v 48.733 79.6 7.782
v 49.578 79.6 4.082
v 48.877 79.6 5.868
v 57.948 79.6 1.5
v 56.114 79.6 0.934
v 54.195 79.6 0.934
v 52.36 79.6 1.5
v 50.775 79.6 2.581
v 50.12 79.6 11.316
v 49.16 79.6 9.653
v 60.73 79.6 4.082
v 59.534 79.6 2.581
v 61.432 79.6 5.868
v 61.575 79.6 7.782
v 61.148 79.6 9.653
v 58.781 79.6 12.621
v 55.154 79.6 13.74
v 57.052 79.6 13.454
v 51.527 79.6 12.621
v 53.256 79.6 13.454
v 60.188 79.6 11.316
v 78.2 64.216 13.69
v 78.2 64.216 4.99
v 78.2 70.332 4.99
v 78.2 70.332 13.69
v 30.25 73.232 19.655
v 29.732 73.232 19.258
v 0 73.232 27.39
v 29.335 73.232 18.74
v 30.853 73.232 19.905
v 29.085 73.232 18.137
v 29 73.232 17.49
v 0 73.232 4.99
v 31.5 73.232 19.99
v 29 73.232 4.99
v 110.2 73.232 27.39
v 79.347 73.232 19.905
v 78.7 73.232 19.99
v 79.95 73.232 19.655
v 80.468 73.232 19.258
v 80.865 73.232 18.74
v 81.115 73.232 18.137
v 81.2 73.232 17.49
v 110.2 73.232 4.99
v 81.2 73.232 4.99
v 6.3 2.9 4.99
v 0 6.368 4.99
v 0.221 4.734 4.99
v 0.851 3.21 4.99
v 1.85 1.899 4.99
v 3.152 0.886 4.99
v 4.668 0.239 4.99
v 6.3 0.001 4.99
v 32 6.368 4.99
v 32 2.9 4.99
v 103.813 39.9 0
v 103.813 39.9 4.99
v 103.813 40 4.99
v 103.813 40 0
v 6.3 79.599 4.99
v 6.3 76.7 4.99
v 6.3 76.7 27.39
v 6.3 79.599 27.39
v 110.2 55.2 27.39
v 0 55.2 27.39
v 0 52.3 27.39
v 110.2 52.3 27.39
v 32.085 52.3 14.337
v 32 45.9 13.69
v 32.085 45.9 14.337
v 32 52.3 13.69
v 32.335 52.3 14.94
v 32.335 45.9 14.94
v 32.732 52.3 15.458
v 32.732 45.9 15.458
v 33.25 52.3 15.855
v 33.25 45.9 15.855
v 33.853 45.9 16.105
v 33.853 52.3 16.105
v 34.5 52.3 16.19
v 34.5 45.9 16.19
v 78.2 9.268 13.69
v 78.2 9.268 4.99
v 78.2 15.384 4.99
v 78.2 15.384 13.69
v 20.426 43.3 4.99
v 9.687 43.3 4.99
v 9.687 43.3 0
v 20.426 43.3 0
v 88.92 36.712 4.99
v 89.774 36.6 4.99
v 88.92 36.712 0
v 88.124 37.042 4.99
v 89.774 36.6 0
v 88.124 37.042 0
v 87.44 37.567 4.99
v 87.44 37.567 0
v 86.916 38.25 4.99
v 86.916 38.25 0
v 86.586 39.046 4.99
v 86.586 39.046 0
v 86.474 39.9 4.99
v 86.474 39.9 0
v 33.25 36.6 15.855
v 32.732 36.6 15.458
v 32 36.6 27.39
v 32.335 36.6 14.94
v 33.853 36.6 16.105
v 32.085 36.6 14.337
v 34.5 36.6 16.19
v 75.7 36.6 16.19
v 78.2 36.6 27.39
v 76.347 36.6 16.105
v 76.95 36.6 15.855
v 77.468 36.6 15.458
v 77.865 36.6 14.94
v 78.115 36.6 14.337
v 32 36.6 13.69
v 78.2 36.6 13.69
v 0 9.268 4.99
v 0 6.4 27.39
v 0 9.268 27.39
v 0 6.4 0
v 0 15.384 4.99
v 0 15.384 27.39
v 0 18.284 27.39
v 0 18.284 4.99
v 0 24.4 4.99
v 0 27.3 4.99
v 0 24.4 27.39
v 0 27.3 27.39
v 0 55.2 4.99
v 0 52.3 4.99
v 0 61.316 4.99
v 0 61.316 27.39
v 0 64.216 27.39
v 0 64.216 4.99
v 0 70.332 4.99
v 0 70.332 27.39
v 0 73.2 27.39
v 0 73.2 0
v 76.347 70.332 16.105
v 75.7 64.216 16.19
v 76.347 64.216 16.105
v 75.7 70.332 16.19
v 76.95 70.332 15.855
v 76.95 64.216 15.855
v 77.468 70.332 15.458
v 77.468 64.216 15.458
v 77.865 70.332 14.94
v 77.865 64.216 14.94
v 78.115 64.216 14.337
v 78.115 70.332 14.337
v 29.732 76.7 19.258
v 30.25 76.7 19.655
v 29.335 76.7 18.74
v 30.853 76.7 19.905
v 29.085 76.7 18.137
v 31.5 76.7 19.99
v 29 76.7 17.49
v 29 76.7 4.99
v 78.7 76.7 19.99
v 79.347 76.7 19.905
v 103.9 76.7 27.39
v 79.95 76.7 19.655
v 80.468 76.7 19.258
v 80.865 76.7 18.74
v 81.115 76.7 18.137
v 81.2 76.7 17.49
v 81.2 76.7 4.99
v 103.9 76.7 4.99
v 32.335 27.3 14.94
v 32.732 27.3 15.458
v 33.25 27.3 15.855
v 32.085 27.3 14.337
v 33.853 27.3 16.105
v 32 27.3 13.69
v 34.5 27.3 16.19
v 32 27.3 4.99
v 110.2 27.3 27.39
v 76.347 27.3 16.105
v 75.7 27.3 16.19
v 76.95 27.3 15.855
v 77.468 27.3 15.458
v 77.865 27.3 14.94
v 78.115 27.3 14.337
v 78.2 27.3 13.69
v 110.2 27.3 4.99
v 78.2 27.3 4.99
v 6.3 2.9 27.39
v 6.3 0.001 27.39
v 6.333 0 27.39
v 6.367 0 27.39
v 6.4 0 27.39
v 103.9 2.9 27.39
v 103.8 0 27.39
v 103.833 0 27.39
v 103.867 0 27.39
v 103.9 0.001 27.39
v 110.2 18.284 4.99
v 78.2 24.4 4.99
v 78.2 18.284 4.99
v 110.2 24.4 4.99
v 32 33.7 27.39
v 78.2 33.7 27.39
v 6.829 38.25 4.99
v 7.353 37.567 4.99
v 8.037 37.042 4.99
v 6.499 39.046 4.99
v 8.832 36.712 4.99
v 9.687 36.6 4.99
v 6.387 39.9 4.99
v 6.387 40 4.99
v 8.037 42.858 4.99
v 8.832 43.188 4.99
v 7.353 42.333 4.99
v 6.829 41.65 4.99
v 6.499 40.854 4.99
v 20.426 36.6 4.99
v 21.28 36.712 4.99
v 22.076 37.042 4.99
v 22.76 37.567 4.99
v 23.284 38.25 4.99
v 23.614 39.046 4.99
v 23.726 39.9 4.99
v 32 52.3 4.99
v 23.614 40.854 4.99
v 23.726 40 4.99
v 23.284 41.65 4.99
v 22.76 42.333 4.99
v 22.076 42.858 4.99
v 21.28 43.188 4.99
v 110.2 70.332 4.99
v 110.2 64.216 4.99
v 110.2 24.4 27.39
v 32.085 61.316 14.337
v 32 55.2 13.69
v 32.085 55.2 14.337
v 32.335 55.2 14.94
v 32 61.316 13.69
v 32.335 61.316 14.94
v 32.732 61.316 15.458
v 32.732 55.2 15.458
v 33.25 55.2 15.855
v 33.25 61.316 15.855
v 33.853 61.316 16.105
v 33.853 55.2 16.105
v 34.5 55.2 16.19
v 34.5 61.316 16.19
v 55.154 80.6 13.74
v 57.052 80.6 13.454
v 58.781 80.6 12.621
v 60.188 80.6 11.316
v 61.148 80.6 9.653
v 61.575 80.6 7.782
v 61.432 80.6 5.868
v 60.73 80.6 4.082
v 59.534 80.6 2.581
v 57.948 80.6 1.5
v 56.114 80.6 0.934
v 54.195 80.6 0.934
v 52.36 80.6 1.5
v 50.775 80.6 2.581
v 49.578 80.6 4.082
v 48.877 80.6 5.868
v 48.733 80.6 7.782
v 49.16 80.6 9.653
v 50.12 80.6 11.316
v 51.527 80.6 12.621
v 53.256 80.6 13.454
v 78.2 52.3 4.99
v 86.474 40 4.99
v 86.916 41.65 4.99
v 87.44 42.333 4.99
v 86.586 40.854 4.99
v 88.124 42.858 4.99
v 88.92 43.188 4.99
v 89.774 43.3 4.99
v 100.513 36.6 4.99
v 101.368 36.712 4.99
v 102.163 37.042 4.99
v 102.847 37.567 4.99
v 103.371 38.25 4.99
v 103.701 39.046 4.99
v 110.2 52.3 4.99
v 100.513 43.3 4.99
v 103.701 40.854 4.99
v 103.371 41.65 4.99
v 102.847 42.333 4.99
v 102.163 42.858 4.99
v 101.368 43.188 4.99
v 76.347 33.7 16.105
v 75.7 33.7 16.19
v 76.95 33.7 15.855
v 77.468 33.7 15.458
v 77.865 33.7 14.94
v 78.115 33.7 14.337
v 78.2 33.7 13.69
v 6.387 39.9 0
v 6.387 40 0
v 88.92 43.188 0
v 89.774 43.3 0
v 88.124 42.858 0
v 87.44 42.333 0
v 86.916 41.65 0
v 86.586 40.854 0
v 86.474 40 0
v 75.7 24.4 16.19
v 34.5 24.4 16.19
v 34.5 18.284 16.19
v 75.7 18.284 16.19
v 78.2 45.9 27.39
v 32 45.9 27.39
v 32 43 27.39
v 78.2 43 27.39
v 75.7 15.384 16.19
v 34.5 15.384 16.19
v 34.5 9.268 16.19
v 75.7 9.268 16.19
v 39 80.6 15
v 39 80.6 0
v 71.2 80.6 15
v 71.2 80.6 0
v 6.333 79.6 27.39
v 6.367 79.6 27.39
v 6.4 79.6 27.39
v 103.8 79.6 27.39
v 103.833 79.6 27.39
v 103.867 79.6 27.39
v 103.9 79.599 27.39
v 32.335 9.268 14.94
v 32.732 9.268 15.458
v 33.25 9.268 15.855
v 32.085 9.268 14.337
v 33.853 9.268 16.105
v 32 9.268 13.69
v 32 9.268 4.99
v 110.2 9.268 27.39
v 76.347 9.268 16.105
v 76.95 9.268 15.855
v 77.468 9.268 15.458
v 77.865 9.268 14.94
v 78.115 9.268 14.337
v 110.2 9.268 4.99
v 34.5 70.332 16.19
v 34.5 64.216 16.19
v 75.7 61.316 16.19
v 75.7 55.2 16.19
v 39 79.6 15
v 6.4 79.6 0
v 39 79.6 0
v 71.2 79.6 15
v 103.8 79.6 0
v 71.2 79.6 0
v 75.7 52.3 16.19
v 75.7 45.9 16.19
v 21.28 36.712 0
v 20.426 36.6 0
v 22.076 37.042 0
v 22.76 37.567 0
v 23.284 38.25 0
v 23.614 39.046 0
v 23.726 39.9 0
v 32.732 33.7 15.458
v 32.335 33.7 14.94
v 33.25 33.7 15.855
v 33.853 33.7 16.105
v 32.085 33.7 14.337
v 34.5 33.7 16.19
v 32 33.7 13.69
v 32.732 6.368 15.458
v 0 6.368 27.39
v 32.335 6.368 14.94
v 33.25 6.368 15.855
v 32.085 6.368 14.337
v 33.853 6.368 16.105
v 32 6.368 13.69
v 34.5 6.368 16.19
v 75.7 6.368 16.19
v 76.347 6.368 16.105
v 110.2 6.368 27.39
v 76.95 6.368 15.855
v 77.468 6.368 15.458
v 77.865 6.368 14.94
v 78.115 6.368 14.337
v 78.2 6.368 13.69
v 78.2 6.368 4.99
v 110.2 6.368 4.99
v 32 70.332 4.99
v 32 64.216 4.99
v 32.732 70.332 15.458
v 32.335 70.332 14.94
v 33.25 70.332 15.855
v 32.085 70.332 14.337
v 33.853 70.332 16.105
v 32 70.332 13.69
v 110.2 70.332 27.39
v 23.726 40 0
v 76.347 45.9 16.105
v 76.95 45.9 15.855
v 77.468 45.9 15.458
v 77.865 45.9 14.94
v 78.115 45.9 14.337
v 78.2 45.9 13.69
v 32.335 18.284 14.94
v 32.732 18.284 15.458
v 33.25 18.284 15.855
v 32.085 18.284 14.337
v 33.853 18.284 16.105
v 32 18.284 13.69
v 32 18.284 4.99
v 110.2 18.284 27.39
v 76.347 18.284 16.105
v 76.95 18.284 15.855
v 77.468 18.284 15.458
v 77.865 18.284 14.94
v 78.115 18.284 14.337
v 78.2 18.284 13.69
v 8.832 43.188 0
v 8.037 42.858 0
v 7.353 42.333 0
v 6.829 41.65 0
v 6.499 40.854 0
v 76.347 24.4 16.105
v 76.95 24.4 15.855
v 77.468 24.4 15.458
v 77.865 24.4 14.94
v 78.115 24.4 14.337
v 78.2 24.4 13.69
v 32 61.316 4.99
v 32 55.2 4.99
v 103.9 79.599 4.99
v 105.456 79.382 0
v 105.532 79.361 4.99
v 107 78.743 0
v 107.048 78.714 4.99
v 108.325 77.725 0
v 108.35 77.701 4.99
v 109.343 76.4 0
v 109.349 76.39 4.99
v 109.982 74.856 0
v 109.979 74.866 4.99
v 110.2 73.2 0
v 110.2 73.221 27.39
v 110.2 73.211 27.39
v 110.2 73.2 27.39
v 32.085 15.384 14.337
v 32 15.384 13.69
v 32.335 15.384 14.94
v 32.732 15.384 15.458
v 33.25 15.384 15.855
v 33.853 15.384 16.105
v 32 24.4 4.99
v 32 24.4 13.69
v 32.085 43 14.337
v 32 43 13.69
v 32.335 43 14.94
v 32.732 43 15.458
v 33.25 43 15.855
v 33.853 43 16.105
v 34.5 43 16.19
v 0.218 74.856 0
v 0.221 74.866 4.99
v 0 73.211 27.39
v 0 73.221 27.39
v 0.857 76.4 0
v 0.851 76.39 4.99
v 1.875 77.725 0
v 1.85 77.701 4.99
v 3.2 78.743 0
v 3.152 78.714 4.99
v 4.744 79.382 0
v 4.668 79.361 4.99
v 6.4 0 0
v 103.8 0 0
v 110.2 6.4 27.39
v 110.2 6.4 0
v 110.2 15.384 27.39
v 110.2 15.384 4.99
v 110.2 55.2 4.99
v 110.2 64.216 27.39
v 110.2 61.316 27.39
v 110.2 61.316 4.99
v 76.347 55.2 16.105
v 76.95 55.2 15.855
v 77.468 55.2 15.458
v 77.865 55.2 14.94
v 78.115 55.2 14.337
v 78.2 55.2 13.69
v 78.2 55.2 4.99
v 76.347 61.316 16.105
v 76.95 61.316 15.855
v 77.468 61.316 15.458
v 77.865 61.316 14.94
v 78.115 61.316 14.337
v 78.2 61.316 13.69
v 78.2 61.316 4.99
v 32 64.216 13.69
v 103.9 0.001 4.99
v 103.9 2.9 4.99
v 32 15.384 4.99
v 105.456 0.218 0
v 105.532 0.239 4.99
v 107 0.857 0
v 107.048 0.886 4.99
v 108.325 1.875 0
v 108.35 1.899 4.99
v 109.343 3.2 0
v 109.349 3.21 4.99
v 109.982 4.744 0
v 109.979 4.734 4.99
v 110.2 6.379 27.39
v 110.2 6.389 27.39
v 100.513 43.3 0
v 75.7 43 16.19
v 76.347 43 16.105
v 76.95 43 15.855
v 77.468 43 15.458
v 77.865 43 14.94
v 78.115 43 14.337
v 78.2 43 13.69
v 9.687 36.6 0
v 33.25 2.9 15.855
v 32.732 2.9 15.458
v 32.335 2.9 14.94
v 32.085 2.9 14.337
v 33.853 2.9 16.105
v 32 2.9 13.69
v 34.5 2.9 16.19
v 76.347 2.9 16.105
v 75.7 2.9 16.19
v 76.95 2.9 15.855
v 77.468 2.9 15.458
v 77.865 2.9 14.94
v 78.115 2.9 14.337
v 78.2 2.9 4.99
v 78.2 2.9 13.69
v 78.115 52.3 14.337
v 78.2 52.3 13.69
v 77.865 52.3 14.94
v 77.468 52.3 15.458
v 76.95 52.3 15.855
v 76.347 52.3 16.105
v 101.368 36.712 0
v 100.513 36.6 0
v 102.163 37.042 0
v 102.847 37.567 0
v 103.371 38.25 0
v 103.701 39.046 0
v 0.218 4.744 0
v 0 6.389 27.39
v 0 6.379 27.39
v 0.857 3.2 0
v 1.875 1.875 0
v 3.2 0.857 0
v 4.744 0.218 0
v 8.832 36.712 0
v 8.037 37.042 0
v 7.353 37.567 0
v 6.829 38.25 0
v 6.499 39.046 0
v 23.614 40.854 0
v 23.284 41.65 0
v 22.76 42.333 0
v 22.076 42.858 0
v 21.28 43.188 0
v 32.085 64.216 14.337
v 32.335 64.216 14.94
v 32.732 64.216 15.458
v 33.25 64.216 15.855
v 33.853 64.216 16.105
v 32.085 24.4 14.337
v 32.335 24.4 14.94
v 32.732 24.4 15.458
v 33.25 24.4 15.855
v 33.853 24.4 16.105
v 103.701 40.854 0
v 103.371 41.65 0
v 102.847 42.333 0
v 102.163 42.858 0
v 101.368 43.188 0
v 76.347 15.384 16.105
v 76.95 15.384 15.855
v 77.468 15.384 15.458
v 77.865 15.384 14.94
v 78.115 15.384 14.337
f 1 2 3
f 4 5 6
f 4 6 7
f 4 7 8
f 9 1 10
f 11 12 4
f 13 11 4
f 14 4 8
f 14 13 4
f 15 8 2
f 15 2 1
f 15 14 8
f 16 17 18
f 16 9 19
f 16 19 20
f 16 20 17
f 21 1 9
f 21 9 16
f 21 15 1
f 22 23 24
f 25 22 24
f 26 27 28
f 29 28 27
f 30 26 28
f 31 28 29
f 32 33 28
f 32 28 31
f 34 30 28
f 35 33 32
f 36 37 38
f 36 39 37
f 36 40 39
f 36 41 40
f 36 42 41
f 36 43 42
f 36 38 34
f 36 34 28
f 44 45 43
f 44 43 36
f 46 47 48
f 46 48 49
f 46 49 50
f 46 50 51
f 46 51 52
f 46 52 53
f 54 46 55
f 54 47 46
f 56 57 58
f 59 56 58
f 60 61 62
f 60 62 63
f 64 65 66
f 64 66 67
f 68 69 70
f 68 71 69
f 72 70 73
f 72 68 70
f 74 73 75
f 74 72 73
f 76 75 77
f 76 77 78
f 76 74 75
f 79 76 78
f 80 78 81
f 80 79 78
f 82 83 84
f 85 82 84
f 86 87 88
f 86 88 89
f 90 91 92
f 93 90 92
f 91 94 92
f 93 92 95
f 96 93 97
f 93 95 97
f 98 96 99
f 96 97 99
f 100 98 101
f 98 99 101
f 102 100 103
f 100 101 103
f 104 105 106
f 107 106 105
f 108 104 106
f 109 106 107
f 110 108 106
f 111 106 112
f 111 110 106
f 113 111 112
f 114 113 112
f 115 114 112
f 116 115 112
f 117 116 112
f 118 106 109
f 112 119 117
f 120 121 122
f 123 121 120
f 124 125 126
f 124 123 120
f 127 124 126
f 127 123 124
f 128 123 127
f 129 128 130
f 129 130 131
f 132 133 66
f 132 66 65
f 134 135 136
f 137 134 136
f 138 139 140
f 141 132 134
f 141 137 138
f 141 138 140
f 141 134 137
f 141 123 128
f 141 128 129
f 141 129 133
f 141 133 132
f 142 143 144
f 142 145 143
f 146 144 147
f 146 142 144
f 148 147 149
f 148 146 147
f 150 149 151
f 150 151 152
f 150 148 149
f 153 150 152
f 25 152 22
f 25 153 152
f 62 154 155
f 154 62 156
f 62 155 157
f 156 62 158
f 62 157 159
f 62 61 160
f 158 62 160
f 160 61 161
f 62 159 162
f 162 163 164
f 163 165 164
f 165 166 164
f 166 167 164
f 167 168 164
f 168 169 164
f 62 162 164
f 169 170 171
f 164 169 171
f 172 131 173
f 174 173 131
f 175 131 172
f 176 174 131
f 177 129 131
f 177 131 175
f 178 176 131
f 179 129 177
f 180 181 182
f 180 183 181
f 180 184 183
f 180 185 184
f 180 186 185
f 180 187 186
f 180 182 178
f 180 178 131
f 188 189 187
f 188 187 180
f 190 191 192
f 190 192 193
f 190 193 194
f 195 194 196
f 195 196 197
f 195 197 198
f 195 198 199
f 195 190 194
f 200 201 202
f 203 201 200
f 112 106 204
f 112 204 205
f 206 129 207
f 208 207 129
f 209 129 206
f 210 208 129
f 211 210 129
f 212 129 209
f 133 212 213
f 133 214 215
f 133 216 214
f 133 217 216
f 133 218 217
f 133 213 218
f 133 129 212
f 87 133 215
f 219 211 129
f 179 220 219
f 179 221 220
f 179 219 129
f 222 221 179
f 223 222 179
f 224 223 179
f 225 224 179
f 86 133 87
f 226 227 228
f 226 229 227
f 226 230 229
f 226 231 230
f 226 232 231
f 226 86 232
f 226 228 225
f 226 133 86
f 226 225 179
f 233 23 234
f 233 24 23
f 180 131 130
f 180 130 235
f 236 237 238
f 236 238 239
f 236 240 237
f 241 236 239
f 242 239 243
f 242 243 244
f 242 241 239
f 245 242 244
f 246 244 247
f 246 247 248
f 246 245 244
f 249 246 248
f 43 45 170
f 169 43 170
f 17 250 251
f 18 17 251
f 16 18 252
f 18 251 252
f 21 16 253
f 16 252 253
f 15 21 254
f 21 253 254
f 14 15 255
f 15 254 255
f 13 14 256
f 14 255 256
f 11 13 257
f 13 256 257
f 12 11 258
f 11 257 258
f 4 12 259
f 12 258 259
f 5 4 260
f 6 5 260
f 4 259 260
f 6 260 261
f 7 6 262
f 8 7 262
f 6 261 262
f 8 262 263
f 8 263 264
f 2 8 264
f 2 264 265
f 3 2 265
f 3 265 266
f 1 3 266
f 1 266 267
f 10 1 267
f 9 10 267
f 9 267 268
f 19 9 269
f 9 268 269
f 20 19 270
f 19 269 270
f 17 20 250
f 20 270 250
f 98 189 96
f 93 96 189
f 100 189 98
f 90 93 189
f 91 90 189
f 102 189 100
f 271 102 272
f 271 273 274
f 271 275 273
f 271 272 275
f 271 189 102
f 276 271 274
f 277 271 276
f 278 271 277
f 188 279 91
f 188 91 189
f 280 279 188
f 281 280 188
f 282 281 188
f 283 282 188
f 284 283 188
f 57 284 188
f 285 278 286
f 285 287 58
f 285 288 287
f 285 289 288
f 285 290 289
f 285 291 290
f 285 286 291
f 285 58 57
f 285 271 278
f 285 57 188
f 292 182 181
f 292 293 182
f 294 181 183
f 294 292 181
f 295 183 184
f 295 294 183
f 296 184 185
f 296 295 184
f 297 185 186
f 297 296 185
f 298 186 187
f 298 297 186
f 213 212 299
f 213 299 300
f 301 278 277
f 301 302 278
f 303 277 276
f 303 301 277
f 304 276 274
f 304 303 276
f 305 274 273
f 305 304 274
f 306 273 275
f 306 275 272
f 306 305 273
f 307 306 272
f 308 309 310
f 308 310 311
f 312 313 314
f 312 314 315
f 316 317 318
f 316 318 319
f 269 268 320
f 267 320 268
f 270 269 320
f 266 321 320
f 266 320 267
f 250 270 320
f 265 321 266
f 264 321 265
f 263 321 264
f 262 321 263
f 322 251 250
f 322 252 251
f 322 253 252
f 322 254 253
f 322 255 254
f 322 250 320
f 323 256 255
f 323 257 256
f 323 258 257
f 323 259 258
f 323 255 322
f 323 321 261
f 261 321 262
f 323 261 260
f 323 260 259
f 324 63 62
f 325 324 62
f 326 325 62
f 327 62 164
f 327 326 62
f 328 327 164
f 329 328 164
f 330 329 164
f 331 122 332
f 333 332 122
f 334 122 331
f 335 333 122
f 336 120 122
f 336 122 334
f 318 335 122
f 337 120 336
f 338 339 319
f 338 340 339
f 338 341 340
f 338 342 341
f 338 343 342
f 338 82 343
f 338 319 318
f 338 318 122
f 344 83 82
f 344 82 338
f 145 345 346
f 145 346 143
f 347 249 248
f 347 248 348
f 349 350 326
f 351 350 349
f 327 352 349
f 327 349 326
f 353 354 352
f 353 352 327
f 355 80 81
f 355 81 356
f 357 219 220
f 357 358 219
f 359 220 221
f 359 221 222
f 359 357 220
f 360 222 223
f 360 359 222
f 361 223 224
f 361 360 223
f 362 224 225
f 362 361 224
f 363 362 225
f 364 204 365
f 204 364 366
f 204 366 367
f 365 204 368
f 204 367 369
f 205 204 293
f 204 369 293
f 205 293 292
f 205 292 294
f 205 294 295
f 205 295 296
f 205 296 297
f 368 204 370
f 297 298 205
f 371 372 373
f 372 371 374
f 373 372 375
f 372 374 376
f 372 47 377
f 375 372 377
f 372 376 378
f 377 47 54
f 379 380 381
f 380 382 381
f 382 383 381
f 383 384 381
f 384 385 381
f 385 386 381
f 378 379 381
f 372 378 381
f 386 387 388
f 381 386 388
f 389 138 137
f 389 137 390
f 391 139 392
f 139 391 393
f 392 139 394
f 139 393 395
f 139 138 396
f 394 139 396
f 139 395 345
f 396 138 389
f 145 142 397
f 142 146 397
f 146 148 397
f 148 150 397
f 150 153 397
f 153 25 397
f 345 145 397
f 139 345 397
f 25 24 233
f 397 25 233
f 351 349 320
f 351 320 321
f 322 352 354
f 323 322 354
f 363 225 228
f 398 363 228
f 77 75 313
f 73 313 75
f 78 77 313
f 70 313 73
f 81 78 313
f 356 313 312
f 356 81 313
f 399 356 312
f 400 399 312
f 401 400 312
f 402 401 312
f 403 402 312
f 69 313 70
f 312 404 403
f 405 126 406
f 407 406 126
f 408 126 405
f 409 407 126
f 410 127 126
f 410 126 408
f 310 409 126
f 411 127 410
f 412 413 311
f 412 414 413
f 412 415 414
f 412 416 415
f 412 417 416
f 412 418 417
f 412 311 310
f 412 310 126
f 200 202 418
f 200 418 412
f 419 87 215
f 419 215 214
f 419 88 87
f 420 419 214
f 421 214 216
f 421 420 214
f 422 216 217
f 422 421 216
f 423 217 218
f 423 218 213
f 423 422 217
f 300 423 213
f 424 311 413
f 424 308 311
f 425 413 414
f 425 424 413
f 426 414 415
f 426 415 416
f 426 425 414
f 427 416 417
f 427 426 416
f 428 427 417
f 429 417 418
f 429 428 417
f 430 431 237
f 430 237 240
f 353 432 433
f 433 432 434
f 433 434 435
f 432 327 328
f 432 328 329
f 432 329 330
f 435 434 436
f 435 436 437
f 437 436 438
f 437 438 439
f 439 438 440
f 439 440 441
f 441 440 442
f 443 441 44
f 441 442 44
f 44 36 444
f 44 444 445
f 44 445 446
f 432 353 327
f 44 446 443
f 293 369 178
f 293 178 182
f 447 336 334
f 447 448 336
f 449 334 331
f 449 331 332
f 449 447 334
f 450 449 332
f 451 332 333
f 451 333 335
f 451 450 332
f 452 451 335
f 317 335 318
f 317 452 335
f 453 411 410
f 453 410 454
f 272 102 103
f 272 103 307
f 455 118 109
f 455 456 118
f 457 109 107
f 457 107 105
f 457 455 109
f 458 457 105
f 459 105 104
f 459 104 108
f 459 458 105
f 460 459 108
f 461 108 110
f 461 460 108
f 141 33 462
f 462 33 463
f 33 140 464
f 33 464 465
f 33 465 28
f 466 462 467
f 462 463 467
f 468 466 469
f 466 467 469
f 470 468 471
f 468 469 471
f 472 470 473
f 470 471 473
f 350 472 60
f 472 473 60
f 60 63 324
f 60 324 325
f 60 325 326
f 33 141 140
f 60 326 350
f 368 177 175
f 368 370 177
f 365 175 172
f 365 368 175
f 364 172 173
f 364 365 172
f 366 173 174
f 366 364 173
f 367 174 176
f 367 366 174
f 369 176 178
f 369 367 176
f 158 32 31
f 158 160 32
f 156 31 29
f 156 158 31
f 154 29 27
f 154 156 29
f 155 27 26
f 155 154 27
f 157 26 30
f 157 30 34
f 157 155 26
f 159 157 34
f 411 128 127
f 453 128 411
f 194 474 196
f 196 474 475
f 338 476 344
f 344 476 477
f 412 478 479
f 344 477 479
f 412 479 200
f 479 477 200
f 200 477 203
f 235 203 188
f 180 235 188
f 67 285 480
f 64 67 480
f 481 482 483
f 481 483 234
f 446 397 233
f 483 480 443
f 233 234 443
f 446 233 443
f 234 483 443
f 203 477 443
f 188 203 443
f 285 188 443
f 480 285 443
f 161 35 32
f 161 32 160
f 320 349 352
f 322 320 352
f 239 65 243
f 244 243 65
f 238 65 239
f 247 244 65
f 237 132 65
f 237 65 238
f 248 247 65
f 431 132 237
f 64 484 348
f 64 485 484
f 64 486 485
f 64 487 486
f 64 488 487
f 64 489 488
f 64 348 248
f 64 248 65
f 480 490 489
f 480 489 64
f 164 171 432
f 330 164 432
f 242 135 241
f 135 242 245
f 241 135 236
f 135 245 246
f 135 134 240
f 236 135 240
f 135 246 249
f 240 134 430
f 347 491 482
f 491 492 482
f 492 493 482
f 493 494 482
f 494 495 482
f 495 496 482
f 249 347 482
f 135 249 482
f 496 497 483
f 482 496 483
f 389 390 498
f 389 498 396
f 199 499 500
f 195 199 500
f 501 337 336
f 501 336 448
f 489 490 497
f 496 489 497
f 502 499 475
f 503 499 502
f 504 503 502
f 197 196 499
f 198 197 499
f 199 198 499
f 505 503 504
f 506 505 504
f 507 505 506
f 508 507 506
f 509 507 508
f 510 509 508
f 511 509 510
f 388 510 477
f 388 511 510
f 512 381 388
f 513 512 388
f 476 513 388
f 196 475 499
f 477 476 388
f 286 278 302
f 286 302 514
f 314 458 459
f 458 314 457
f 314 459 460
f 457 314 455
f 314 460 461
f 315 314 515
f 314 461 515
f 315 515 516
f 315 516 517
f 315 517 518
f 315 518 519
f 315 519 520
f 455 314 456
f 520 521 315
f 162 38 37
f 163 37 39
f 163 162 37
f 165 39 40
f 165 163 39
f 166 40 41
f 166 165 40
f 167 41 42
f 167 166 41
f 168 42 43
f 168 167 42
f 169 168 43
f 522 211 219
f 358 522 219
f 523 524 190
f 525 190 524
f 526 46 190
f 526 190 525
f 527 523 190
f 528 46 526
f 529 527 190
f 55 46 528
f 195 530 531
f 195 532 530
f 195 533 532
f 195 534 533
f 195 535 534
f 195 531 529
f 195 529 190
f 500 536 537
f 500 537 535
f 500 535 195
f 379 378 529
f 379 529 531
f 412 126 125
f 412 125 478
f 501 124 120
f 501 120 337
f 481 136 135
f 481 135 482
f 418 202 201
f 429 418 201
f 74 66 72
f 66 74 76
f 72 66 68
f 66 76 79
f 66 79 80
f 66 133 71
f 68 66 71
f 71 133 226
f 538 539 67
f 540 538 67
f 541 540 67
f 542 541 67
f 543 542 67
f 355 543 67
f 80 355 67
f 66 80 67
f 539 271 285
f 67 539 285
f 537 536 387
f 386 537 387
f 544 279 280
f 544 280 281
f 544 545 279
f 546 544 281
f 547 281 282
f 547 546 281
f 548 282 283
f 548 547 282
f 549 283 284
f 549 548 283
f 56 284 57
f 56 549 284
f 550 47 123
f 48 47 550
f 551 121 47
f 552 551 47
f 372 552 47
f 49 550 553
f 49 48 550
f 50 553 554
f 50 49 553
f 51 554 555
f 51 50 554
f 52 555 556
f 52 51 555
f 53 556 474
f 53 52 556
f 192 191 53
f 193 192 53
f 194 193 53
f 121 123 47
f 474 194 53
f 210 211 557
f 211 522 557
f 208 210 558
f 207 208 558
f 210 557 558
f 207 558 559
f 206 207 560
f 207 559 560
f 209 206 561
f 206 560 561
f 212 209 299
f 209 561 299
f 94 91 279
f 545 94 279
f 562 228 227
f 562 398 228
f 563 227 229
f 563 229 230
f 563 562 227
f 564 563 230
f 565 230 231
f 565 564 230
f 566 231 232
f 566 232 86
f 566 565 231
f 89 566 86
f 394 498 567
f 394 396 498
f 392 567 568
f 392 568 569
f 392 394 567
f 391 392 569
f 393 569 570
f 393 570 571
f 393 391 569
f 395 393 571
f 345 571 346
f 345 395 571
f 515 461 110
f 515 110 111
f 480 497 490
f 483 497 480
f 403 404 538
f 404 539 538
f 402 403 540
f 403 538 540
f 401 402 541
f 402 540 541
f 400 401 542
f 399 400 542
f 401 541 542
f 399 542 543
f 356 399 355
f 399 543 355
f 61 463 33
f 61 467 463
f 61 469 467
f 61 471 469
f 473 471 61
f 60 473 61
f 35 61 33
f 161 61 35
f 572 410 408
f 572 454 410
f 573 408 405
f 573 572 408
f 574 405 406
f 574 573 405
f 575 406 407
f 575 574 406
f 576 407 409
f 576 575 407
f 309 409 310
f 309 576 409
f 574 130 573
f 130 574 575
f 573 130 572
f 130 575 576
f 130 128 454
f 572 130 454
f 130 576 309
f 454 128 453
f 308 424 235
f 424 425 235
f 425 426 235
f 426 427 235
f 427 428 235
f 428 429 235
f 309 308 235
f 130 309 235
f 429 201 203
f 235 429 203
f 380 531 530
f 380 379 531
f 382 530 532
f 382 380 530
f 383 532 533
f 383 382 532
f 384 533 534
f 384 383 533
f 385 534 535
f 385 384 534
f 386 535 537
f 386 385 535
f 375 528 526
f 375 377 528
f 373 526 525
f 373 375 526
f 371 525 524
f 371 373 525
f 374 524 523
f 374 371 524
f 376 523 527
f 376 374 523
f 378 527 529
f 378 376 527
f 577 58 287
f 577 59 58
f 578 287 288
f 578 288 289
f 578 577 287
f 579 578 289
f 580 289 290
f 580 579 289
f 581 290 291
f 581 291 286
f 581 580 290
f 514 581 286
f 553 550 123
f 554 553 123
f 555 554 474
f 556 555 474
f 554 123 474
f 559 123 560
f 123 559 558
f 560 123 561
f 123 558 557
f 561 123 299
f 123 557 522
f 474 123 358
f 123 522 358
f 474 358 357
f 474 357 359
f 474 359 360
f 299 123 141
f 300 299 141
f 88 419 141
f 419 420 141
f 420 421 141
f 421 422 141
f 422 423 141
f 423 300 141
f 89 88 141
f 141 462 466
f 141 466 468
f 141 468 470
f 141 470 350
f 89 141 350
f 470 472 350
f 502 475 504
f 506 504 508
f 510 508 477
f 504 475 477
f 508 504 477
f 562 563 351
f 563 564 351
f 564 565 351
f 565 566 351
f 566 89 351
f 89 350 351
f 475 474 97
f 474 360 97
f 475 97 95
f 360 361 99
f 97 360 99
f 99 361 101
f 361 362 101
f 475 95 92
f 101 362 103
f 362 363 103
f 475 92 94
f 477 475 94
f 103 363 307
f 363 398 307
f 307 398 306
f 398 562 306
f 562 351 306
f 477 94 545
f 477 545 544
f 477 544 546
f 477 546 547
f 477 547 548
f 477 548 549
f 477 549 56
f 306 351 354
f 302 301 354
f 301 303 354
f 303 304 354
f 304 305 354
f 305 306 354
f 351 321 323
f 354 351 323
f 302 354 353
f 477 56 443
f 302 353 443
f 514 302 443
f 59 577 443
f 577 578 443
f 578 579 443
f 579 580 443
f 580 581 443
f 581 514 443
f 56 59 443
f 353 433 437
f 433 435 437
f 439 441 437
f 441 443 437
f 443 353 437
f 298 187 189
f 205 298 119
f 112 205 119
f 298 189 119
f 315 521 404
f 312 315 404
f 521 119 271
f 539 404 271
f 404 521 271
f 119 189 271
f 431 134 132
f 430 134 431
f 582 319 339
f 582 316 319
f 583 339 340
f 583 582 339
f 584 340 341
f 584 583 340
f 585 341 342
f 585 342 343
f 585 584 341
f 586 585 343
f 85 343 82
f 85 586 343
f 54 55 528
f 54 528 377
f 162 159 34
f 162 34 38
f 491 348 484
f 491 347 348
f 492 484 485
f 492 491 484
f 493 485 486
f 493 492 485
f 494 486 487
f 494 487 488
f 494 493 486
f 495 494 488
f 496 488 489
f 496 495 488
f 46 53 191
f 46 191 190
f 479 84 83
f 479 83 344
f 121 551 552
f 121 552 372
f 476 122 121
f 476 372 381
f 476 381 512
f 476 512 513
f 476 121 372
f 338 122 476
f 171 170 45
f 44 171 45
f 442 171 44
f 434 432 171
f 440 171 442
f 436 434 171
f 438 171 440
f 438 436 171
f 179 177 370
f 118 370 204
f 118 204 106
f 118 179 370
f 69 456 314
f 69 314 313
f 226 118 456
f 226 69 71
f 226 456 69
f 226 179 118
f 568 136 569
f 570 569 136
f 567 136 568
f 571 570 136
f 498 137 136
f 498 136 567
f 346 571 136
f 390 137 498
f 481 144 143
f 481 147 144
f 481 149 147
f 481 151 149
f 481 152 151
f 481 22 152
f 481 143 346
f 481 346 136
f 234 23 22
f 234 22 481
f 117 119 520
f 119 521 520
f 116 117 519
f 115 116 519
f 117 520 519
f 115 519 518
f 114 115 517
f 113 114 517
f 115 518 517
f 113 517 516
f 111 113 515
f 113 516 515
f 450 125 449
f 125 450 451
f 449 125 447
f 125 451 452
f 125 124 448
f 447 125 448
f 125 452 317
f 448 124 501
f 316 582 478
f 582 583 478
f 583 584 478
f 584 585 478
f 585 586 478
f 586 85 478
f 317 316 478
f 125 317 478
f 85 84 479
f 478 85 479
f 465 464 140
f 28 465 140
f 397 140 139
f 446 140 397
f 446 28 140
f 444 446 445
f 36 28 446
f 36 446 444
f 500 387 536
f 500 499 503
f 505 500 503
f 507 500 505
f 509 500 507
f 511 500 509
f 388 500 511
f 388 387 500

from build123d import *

# Parameters (mm, degrees)
SKETCH_1_W          = 110.2
SKETCH_1_H          = 79.6
EXTRUDE_1_DEPTH     = 4.99
SKETCH_2_W          = 52.2
SKETCH_2_H          = 6.4
EXTRUDE_2_DEPTH     = 15
SKETCH_3_W          = 46.2
SKETCH_3_H          = 73.2
EXTRUDE_3_DEPTH     = 11.2
SKETCH_4_W          = 97.6
SKETCH_4_H          = 2.9
SKETCH_4_W_2        = 46.2
SKETCH_4_W_3        = 110.2
EXTRUDE_4_DEPTH     = 22.4
SKETCH_5_W          = 17.339600334
SKETCH_5_H          = 6.7
CUT_EXTRUDE_1_DEPTH = 138.775034023
FILLET_1_R          = 3.3
FILLET_2_R          = 6.4
FILLET_3_R          = 2.5
SKETCH_6_W          = 32.2
SKETCH_6_H          = 15
EXTRUDE_5_DEPTH     = 1
SKETCH_7_R          = 6.438822501
CUT_EXTRUDE_2_DEPTH = 1


with BuildPart() as part:
    # ｽｹｯﾁ1 → ﾎﾞｽ - 押し出し1 (new body)
    with BuildSketch(Plane.XY):
        with Locations((55.1, 39.8)):
            Rectangle(SKETCH_1_W, SKETCH_1_H)
    extrude(amount=EXTRUDE_1_DEPTH)

    # ｽｹｯﾁ2 → ﾎﾞｽ - 押し出し2 (add)
    with BuildSketch(Plane.XY.offset(4.99)):
        with Locations((55.1, 76.4)):
            Rectangle(SKETCH_2_W, SKETCH_2_H)
    extrude(amount=EXTRUDE_2_DEPTH)

    # ｽｹｯﾁ3 → ﾎﾞｽ - 押し出し3 (add)
    with BuildSketch(Plane.XY.offset(4.99)):
        with Locations((55.1, 36.6)):
            Rectangle(SKETCH_3_W, SKETCH_3_H)
    extrude(amount=EXTRUDE_3_DEPTH)

    # ｽｹｯﾁ4 → ﾎﾞｽ - 押し出し4 (add)
    with BuildSketch(Plane.XY.offset(4.99)):
        with Locations((55.1, 78.15)):
            Rectangle(SKETCH_4_W, SKETCH_4_H)
        with Locations((55.1, 1.45)):
            Rectangle(SKETCH_4_W, SKETCH_4_H)
        with Locations((55.1, 44.45)):
            Rectangle(SKETCH_4_W_2, SKETCH_4_H)
        with Locations((55.1, 35.15)):
            Rectangle(SKETCH_4_W_2, SKETCH_4_H)
        with Locations((55.1, 53.75)):
            Rectangle(SKETCH_4_W_3, SKETCH_4_H)
        with Locations((55.1, 25.85)):
            Rectangle(SKETCH_4_W_3, SKETCH_4_H)
        with Locations((55.1, 71.781871857)):
            Rectangle(SKETCH_4_W_3, SKETCH_4_H)
        with Locations((55.1, 7.818128143)):
            Rectangle(SKETCH_4_W_3, SKETCH_4_H)
        with Locations((55.1, 16.834064072)):
            Rectangle(SKETCH_4_W_3, SKETCH_4_H)
        with Locations((55.1, 62.765935928)):
            Rectangle(SKETCH_4_W_3, SKETCH_4_H)
    extrude(amount=EXTRUDE_4_DEPTH)

    # ｽｹｯﾁ5 → ｶｯﾄ - 押し出し1 (cut, through all)
    with BuildSketch(Plane.XY.offset(4.99)):
        with Locations((15.05636048, 39.95)):
            Rectangle(SKETCH_5_W, SKETCH_5_H)
        with Locations((95.14363952, 39.95)):
            Rectangle(SKETCH_5_W, SKETCH_5_H)
    extrude(amount=-CUT_EXTRUDE_1_DEPTH, mode=Mode.SUBTRACT)

    # ﾌｨﾚｯﾄ1
    fillet_1_edges = [part.edges().sort_by_distance(p)[0] for p in [
        (6.386560313, 36.6, 2.495),
        (6.386560313, 43.3, 2.495),
        (23.726160647, 43.3, 2.495),
        (23.726160647, 36.6, 2.495),
        (86.473839353, 43.3, 2.495),
        (103.813439687, 43.3, 2.495),
        (103.813439687, 36.6, 2.495),
        (86.473839353, 36.6, 2.495),
    ]]
    fillet(fillet_1_edges, radius=FILLET_1_R)

    # ﾌｨﾚｯﾄ2
    fillet_2_edges = [part.edges().sort_by_distance(p)[0] for p in [
        (0, 0, 2.495),
        (110.2, 0, 2.495),
        (110.2, 79.6, 2.495),
        (0, 79.6, 2.495),
    ]]
    fillet(fillet_2_edges, radius=FILLET_2_R)

    # ﾌｨﾚｯﾄ3
    fillet_3_edges = [part.edges().sort_by_distance(p)[0] for p in [
        (78.2, 49.1, 16.19),
        (32, 39.8, 16.19),
        (78.2, 58.257967964, 16.19),
        (32, 49.1, 16.19),
        (78.2, 30.5, 16.19),
        (32, 21.342032036, 16.19),
        (81.2, 74.965935928, 19.99),
        (32, 67.273903893, 16.19),
        (78.2, 12.326096107, 16.19),
        (32, 4.634064072, 16.19),
        (32, 12.326096107, 16.19),
        (78.2, 21.342032036, 16.19),
        (78.2, 67.273903893, 16.19),
        (32, 58.257967964, 16.19),
        (29, 74.965935928, 19.99),
        (78.2, 4.634064072, 16.19),
        (32, 30.5, 16.19),
        (78.2, 39.8, 16.19),
    ]]
    fillet(fillet_3_edges, radius=FILLET_3_R)

    # ｽｹｯﾁ6 → ﾎﾞｽ - 押し出し5 (add)
    with BuildSketch(Plane(origin=(0, 79.6, 0), x_dir=(1, 0, 0), z_dir=(0, 1, 0))):
        with Locations((55.1, -7.5)):
            Rectangle(SKETCH_6_W, SKETCH_6_H)
    extrude(amount=EXTRUDE_5_DEPTH)

    # ｽｹｯﾁ7 → ｶｯﾄ - 押し出し2 (cut)
    with BuildSketch(Plane(origin=(0, 80.6, 0), x_dir=(1, 0, 0), z_dir=(0, 1, 0))):
        with Locations(Location((55.154186251, -7.301022377, 0), (0, 0, 270))):
            Circle(SKETCH_7_R)
    extrude(amount=-CUT_EXTRUDE_2_DEPTH, mode=Mode.SUBTRACT)


solid = part.part
